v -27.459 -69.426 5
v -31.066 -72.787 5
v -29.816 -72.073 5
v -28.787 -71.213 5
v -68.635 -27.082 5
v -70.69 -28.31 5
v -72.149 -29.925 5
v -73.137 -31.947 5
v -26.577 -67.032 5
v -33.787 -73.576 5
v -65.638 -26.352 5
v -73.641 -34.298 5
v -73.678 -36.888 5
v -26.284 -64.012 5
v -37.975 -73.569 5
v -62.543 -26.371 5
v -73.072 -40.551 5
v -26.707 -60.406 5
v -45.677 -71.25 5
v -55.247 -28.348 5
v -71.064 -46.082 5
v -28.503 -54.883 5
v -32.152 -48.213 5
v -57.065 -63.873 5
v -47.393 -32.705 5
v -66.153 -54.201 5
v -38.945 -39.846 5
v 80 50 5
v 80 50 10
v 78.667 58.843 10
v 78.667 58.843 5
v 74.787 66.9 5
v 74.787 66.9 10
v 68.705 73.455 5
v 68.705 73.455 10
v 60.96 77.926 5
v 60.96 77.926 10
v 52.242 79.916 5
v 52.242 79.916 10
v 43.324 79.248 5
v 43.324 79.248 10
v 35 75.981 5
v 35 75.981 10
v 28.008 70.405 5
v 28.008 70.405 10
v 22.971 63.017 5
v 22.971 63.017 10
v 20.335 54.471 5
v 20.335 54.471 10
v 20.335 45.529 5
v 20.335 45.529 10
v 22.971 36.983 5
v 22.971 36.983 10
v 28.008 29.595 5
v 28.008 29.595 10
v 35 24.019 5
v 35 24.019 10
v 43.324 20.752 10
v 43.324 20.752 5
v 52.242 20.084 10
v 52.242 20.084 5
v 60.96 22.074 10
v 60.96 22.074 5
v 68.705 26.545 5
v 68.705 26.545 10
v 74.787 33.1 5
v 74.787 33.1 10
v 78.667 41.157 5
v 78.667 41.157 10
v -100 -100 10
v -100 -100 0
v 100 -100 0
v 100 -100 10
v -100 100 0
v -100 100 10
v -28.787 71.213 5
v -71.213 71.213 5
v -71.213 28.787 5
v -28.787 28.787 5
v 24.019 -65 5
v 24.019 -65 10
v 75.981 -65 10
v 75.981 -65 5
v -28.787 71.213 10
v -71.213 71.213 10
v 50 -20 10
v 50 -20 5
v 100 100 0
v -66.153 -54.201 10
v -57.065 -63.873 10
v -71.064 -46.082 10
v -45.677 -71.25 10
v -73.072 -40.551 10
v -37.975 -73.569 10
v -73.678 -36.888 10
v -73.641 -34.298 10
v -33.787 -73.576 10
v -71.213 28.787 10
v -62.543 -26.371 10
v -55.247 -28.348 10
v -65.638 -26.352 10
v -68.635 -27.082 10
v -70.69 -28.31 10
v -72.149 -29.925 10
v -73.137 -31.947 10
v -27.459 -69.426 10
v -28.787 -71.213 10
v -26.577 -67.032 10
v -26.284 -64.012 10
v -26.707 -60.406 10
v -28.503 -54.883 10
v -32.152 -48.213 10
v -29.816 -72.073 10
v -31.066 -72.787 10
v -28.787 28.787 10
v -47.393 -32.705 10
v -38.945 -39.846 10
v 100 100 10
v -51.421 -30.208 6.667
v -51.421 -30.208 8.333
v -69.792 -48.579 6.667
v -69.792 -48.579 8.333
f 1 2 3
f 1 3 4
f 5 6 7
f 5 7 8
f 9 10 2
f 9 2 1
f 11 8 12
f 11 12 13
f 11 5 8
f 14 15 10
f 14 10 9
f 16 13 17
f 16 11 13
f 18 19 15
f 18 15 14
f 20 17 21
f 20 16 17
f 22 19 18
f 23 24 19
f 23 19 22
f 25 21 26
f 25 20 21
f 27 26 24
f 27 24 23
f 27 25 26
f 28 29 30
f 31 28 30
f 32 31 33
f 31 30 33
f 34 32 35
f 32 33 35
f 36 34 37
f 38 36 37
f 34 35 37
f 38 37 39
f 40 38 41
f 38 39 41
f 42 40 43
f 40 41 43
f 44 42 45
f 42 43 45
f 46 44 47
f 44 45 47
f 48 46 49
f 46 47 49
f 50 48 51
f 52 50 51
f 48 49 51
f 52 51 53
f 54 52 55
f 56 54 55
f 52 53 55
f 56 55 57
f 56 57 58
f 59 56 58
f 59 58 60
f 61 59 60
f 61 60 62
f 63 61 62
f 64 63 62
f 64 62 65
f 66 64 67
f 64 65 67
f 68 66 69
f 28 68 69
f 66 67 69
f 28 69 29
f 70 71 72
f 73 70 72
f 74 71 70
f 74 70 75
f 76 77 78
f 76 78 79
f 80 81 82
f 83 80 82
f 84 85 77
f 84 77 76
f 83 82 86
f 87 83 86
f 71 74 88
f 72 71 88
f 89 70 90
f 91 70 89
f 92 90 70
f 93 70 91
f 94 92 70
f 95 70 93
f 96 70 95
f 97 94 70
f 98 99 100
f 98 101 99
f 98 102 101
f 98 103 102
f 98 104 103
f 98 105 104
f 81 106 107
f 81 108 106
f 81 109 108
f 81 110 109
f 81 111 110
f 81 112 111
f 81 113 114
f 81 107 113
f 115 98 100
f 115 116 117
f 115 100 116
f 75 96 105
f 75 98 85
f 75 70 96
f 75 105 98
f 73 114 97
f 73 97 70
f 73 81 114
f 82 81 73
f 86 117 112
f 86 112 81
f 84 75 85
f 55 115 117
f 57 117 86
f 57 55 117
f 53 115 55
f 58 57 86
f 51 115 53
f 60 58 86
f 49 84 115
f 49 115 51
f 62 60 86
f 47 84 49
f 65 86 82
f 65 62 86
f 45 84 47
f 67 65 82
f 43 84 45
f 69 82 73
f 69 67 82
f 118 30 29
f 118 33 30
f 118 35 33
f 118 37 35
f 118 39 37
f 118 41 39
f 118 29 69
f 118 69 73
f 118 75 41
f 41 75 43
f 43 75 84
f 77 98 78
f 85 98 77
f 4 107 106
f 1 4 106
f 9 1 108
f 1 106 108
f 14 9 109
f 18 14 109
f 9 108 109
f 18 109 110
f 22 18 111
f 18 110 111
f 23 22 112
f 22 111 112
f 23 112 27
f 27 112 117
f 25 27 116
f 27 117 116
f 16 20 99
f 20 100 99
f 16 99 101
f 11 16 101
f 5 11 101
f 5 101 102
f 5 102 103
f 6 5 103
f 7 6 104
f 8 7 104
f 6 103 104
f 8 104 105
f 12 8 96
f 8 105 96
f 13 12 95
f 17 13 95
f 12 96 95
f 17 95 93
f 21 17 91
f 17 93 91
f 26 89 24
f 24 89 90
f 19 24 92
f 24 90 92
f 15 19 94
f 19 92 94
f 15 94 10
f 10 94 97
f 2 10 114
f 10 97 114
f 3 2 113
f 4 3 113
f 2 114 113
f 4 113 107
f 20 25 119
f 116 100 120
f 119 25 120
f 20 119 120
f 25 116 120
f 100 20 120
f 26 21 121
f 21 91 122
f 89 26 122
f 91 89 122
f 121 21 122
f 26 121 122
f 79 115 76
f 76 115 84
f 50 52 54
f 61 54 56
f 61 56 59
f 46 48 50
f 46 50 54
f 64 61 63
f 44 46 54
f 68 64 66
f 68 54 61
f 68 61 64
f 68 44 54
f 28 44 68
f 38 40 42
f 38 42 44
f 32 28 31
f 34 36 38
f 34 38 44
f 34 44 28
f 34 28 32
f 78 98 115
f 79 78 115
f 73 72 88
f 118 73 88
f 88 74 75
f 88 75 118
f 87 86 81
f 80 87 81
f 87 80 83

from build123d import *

# Parameters (mm, degrees)
SKETCH_W     = 200
SKETCH_H     = 200
PAD_DEPTH    = 10
SKETCH001_R  = 30
SKETCH001_W  = 42.426406
SKETCH001_H  = 42.426406
POCKET_DEPTH = 5


with BuildPart() as part:
    # Sketch → Pad (new body)
    with BuildSketch(Plane.XY):
        Rectangle(SKETCH_W, SKETCH_H)
    extrude(amount=PAD_DEPTH)

    # Sketch001 (on Face6 of Pad) → Pocket (cut)
    with BuildSketch(Plane.XY.offset(10)):
        with Locations((50, 50)):
            Circle(SKETCH001_R)
        with BuildLine():
            add(Edge.make_bspline(
                [(-28.786797, -71.213203), (-10.415623, -52.84203), (-51.421015, -30.207812), (-92.426407, -7.573593), (-69.792188, -48.578985), (-47.15797, -89.584377), (-28.786797, -71.213203)],
                knots=[0, 0, 0, 2.094395, 2.094395, 4.18879, 4.18879, 6.283185, 6.283185, 6.283185], degree=2, weights=[1, 0.5, 1, 0.5, 1, 0.5, 1]))
        make_face()
        Polygon((75.980762, -65), (50, -20), (24.019238, -65), align=None)
        with Locations((-50, 50)):
            Rectangle(SKETCH001_W, SKETCH001_H)
    extrude(amount=-POCKET_DEPTH, mode=Mode.SUBTRACT)


solid = part.part
